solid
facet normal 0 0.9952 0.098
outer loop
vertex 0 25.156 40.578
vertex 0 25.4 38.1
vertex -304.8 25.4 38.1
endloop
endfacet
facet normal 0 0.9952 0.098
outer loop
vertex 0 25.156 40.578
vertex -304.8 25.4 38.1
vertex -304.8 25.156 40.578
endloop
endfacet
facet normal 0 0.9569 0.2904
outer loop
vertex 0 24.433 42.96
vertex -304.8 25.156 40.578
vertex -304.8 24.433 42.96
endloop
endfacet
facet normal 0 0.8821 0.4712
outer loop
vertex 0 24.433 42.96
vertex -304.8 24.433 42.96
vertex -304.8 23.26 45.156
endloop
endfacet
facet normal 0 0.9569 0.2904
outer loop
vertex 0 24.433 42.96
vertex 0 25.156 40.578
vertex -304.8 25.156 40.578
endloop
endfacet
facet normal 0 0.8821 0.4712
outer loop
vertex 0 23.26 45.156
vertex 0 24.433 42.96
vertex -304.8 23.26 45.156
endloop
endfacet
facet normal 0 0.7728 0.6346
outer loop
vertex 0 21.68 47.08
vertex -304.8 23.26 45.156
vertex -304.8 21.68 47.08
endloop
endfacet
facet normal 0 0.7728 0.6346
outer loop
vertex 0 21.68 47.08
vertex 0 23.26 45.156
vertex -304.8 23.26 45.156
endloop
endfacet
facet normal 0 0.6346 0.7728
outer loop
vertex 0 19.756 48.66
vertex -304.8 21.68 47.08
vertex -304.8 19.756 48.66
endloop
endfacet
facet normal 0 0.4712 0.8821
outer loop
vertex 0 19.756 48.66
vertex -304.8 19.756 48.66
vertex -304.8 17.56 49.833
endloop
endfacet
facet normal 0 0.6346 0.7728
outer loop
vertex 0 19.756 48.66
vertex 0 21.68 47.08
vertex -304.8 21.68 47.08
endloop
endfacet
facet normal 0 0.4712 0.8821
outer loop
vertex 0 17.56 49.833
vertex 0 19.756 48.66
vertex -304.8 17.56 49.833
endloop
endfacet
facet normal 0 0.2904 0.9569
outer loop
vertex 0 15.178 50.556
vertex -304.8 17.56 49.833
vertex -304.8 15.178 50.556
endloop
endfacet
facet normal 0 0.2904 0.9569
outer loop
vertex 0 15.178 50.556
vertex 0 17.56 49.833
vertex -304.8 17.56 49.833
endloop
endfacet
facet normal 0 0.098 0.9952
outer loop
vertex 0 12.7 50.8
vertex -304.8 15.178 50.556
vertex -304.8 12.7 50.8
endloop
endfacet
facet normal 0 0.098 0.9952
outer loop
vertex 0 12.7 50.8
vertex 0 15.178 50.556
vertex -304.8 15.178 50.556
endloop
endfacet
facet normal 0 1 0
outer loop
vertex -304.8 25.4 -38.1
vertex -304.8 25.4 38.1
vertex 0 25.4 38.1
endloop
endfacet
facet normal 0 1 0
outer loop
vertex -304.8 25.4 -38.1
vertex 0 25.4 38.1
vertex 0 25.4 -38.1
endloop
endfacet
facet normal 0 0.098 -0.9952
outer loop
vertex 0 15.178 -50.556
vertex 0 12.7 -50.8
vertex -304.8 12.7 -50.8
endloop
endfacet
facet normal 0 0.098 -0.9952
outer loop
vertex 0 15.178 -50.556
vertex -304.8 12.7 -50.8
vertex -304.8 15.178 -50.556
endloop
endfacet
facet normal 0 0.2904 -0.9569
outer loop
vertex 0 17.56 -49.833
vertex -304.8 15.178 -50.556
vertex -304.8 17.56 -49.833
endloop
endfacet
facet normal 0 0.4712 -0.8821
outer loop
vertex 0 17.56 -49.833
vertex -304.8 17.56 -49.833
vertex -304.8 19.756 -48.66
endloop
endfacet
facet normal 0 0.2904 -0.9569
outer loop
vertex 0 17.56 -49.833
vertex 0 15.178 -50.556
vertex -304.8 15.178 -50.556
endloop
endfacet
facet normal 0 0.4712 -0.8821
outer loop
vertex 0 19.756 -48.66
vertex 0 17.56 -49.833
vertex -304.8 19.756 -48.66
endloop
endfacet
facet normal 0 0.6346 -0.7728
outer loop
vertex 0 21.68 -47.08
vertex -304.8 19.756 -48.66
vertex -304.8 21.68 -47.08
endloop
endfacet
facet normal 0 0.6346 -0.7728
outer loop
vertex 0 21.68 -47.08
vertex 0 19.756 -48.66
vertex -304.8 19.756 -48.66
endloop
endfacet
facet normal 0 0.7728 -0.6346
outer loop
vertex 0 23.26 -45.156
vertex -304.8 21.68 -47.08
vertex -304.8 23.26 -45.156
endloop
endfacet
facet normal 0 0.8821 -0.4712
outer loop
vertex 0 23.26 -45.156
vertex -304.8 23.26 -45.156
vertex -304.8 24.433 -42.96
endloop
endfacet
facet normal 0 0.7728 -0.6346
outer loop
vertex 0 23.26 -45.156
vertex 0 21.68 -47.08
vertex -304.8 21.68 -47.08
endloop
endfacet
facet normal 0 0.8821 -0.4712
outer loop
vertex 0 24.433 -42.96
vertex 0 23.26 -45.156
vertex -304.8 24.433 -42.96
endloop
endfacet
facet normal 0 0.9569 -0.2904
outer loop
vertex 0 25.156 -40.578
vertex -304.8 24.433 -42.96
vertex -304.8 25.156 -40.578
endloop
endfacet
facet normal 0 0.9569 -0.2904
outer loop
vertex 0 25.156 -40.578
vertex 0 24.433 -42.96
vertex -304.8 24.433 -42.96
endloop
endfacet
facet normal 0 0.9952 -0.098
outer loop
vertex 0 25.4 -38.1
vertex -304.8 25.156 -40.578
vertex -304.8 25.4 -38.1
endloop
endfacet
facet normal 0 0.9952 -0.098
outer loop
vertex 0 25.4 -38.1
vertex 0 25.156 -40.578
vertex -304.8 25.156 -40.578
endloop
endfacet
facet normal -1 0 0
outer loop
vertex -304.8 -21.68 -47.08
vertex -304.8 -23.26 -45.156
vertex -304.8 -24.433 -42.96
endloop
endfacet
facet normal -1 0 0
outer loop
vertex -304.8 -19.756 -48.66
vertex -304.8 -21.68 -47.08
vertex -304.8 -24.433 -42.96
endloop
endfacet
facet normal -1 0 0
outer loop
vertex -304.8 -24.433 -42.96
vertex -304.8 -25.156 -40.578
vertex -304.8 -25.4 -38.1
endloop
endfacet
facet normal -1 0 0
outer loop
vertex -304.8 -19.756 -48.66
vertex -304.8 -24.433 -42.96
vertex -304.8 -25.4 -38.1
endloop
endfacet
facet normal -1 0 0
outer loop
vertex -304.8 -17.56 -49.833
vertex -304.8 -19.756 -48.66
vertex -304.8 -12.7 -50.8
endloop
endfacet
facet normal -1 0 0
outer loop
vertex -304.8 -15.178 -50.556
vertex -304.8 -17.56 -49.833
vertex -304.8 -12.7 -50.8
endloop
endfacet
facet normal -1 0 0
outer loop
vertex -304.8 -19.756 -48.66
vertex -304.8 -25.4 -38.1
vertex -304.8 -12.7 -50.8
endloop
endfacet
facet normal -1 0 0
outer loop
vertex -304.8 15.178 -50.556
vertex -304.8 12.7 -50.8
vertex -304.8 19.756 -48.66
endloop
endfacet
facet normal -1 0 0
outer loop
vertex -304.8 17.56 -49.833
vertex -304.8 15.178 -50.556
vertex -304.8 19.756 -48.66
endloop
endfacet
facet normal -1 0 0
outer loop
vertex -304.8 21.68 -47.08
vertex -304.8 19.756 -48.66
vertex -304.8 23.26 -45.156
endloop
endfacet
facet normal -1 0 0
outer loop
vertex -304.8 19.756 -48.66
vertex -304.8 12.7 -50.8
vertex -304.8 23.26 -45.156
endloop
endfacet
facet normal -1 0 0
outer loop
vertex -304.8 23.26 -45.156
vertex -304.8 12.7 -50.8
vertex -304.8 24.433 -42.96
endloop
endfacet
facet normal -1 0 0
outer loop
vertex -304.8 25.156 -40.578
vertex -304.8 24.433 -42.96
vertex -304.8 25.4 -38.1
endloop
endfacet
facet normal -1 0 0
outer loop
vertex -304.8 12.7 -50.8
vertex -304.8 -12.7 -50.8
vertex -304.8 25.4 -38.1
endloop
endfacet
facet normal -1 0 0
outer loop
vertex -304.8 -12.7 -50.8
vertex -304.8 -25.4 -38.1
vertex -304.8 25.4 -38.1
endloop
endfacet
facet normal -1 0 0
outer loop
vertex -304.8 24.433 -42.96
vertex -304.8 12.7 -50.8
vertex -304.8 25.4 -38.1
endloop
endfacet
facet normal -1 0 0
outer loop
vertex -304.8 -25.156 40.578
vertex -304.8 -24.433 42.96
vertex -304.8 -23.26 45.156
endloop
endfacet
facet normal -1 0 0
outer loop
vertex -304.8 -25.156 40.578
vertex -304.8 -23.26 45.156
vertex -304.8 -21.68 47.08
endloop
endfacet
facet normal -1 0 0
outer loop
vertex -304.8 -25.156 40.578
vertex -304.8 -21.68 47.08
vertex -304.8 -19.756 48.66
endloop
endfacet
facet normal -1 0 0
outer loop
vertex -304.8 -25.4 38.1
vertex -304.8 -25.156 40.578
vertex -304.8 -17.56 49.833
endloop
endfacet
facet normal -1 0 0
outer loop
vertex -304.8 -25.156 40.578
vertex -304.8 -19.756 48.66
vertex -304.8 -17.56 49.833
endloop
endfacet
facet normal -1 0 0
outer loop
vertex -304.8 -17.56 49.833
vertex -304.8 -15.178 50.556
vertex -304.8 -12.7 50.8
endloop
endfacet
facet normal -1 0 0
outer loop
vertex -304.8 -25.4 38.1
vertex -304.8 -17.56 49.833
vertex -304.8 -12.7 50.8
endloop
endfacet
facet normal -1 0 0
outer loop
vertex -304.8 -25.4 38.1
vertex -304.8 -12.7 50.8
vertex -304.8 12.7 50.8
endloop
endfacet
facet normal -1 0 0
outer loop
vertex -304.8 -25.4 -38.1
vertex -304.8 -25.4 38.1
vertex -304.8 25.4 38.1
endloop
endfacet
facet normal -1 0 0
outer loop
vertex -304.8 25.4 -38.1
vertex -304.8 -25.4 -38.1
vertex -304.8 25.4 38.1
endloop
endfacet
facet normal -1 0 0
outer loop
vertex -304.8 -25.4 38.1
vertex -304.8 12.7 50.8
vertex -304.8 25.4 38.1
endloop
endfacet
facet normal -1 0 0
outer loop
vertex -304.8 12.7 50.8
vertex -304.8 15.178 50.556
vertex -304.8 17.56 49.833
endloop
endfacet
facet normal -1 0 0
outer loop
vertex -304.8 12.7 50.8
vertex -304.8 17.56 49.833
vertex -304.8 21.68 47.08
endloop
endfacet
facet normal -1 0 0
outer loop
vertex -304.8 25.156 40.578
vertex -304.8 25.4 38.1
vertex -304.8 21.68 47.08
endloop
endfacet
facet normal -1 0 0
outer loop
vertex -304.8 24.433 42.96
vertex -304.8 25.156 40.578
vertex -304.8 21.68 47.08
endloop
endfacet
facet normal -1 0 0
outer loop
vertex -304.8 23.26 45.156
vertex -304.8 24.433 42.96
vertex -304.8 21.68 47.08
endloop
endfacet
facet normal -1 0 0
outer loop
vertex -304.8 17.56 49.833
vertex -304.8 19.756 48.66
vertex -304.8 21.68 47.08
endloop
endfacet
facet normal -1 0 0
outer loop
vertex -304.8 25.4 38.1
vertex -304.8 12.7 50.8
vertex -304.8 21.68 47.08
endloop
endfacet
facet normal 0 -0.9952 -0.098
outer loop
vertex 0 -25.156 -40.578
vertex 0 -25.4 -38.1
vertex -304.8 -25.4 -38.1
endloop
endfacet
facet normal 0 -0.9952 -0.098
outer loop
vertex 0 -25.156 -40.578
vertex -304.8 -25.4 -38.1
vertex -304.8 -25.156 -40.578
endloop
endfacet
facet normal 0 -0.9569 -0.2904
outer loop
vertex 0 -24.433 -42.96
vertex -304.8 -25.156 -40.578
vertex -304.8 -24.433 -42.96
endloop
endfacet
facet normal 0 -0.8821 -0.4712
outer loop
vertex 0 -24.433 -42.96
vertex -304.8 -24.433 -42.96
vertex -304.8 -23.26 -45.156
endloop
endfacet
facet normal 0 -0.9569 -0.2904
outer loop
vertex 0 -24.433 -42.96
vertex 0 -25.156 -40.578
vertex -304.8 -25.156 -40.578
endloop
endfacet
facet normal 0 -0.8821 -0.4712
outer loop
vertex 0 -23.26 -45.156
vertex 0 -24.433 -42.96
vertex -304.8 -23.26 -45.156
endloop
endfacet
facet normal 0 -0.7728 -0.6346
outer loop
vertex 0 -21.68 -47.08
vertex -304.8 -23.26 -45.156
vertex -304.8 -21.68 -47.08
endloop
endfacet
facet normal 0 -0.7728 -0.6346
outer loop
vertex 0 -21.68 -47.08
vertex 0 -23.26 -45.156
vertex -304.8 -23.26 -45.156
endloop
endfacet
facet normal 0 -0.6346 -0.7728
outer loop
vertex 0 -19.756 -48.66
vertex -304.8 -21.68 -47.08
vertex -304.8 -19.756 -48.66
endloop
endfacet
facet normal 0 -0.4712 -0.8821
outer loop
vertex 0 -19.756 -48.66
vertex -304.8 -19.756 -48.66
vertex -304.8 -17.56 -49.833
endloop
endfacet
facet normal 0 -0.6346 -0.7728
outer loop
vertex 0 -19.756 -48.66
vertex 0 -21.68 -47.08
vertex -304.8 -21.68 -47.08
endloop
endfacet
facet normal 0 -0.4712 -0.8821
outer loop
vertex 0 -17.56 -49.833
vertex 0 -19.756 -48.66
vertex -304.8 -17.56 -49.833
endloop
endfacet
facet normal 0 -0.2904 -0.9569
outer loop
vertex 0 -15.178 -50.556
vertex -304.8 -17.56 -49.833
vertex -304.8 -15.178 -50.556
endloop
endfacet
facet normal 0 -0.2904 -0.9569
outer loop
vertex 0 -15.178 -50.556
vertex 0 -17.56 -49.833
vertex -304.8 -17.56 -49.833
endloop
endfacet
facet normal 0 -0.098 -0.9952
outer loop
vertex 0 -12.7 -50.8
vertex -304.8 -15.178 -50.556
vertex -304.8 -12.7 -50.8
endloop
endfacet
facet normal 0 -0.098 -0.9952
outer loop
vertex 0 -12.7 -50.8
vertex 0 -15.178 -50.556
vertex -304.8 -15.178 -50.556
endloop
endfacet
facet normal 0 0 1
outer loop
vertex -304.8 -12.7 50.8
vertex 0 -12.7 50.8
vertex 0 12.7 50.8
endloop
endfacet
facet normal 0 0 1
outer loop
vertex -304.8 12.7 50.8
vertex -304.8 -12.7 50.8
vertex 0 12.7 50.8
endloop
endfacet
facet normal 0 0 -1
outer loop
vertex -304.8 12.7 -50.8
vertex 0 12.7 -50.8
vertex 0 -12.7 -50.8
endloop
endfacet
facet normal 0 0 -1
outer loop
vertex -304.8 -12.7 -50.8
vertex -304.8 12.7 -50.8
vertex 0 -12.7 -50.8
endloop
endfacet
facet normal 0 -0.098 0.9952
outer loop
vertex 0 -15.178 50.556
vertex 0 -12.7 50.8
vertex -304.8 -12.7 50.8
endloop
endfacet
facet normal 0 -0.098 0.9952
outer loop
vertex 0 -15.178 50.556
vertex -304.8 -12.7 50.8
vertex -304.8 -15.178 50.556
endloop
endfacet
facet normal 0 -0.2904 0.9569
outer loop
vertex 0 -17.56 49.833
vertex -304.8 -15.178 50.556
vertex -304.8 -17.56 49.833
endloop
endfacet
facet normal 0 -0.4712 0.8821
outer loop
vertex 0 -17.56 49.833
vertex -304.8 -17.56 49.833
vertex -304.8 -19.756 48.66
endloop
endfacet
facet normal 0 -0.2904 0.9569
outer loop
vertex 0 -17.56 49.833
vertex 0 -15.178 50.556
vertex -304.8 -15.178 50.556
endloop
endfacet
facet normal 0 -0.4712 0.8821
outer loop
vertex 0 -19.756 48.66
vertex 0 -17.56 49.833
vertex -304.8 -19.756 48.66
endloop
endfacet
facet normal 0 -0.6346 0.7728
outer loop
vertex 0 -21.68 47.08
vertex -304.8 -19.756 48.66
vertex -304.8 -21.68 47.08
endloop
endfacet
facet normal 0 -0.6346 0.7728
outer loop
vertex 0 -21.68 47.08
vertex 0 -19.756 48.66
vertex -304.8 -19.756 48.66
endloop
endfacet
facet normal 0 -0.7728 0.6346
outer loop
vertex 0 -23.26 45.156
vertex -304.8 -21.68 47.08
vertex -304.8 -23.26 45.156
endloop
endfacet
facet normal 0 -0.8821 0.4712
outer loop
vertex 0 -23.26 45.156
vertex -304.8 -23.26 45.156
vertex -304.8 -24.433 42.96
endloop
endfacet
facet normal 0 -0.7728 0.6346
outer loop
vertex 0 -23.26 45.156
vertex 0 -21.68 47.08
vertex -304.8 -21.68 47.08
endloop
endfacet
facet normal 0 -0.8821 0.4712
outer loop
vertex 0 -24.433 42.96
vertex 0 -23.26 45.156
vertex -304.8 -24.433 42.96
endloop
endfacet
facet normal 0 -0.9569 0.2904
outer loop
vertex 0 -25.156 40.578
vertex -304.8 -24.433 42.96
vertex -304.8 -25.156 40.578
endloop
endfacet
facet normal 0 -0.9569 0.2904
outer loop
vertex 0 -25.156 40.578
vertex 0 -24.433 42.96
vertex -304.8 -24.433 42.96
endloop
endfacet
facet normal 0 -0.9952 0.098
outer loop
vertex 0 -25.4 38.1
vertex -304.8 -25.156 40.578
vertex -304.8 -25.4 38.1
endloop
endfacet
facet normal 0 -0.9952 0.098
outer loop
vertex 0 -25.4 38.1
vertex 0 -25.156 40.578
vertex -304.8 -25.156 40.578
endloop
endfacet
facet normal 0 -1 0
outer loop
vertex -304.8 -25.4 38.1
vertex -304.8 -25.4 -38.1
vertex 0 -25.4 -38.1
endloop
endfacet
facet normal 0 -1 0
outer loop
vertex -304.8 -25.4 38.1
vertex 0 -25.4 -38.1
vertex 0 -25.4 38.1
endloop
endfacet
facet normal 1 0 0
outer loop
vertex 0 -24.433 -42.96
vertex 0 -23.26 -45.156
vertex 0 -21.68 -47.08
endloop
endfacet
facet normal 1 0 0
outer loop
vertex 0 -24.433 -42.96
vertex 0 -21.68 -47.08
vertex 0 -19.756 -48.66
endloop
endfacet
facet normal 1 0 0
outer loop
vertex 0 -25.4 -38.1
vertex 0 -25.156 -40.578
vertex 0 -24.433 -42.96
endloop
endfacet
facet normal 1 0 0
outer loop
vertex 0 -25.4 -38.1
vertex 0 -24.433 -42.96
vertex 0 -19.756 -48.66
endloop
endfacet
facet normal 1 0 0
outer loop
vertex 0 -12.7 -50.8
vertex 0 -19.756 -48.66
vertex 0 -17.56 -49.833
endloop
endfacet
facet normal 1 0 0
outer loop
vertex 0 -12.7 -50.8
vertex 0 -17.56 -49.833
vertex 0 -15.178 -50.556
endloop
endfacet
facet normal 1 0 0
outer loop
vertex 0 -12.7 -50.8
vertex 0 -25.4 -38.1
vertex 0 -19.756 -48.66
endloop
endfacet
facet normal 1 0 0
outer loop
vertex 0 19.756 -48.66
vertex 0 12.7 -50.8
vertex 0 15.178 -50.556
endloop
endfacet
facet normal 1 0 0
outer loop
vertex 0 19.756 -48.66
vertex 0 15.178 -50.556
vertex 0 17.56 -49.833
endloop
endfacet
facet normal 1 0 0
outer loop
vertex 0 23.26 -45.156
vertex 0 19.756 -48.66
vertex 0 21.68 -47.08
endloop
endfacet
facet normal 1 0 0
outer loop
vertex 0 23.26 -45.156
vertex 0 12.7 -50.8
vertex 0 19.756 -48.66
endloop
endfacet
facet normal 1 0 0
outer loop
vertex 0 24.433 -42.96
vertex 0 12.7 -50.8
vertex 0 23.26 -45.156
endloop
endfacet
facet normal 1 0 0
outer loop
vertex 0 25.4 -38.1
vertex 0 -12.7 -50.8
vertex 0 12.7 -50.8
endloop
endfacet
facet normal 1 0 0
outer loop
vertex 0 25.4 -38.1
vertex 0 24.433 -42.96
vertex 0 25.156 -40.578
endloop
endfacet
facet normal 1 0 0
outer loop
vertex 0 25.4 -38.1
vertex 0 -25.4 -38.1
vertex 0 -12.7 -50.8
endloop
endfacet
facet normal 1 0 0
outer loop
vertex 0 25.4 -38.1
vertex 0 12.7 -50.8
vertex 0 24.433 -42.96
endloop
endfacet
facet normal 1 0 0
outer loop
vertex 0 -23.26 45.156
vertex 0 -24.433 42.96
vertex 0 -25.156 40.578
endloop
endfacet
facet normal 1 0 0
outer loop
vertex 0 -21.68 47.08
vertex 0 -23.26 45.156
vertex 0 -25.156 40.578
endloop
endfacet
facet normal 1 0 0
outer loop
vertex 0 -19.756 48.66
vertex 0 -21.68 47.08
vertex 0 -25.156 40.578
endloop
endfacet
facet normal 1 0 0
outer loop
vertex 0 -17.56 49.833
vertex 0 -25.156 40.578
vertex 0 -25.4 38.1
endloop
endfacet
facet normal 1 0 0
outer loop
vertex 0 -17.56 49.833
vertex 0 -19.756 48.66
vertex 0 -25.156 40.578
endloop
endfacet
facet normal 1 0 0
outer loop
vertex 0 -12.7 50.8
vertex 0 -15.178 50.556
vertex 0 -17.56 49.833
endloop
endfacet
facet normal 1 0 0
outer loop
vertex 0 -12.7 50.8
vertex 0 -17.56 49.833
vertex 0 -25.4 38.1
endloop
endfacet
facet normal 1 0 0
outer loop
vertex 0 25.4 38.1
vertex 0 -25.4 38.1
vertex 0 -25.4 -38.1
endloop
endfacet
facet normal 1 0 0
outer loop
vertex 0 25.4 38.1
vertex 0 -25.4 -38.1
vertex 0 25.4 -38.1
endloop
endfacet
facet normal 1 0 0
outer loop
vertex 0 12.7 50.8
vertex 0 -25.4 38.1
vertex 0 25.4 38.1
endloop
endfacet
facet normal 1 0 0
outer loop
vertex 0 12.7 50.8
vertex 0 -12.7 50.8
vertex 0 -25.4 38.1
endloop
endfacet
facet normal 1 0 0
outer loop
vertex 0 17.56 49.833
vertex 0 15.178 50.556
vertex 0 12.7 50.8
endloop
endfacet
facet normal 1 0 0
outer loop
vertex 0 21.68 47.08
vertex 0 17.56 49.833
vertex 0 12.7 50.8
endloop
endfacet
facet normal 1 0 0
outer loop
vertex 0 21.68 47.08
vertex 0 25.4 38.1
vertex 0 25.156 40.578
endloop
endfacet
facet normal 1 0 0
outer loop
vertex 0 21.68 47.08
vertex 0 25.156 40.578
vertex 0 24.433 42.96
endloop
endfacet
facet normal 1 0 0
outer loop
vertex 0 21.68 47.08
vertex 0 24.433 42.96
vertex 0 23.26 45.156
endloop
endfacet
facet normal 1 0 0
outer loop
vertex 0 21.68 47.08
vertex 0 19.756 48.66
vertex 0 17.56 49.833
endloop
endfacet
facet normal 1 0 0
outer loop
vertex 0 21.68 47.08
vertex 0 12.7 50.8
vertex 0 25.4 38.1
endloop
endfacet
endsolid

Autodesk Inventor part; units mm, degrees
ref_plane "YZ Plane" through (0, 0, 0) normal (1, 0, 0) x (0, 1, 0)
ref_plane "XZ Plane" through (0, 0, 0) normal (0, 1, 0) x (-1, 0, 0)
ref_plane "XY Plane" through (0, 0, 0) normal (0, 0, 1) x (1, 0, 0)
sketch "Sketch1" plane through (0, 0, 0) normal (1, 0, 0) x (0, 1, 0)
  line L0 (-12.7, 50.8) -> (12.7, 50.8)
  line L1 (25.4, 38.1) -> (25.4, -38.1)
  line L2 (12.7, -50.8) -> (-12.7, -50.8)
  line L3 (-25.4, -38.1) -> (-25.4, 38.1)
  line L4 (-25.4, 50.8) -> (25.4, -50.8) construction
  line L5 (25.4, 50.8) -> (-25.4, -50.8) construction
  arc A0 (25.4, 38.1) -> (12.7, 50.8) centre (12.7, 38.1) ccw
  arc A1 (-12.7, 50.8) -> (-25.4, 38.1) centre (-12.7, 38.1) ccw
  arc A2 (-25.4, -38.1) -> (-12.7, -50.8) centre (-12.7, -38.1) ccw
  arc A3 (12.7, -50.8) -> (25.4, -38.1) centre (12.7, -38.1) ccw
  point P0 (0, 0)
  dimension "d0" = 101.6
  dimension "d1" = 50.8
  dimension "d2" = 12.7
extrude "Extrusion1" add sketch "Sketch1" against normal blind 304.8
properties part number "Wood-3"
